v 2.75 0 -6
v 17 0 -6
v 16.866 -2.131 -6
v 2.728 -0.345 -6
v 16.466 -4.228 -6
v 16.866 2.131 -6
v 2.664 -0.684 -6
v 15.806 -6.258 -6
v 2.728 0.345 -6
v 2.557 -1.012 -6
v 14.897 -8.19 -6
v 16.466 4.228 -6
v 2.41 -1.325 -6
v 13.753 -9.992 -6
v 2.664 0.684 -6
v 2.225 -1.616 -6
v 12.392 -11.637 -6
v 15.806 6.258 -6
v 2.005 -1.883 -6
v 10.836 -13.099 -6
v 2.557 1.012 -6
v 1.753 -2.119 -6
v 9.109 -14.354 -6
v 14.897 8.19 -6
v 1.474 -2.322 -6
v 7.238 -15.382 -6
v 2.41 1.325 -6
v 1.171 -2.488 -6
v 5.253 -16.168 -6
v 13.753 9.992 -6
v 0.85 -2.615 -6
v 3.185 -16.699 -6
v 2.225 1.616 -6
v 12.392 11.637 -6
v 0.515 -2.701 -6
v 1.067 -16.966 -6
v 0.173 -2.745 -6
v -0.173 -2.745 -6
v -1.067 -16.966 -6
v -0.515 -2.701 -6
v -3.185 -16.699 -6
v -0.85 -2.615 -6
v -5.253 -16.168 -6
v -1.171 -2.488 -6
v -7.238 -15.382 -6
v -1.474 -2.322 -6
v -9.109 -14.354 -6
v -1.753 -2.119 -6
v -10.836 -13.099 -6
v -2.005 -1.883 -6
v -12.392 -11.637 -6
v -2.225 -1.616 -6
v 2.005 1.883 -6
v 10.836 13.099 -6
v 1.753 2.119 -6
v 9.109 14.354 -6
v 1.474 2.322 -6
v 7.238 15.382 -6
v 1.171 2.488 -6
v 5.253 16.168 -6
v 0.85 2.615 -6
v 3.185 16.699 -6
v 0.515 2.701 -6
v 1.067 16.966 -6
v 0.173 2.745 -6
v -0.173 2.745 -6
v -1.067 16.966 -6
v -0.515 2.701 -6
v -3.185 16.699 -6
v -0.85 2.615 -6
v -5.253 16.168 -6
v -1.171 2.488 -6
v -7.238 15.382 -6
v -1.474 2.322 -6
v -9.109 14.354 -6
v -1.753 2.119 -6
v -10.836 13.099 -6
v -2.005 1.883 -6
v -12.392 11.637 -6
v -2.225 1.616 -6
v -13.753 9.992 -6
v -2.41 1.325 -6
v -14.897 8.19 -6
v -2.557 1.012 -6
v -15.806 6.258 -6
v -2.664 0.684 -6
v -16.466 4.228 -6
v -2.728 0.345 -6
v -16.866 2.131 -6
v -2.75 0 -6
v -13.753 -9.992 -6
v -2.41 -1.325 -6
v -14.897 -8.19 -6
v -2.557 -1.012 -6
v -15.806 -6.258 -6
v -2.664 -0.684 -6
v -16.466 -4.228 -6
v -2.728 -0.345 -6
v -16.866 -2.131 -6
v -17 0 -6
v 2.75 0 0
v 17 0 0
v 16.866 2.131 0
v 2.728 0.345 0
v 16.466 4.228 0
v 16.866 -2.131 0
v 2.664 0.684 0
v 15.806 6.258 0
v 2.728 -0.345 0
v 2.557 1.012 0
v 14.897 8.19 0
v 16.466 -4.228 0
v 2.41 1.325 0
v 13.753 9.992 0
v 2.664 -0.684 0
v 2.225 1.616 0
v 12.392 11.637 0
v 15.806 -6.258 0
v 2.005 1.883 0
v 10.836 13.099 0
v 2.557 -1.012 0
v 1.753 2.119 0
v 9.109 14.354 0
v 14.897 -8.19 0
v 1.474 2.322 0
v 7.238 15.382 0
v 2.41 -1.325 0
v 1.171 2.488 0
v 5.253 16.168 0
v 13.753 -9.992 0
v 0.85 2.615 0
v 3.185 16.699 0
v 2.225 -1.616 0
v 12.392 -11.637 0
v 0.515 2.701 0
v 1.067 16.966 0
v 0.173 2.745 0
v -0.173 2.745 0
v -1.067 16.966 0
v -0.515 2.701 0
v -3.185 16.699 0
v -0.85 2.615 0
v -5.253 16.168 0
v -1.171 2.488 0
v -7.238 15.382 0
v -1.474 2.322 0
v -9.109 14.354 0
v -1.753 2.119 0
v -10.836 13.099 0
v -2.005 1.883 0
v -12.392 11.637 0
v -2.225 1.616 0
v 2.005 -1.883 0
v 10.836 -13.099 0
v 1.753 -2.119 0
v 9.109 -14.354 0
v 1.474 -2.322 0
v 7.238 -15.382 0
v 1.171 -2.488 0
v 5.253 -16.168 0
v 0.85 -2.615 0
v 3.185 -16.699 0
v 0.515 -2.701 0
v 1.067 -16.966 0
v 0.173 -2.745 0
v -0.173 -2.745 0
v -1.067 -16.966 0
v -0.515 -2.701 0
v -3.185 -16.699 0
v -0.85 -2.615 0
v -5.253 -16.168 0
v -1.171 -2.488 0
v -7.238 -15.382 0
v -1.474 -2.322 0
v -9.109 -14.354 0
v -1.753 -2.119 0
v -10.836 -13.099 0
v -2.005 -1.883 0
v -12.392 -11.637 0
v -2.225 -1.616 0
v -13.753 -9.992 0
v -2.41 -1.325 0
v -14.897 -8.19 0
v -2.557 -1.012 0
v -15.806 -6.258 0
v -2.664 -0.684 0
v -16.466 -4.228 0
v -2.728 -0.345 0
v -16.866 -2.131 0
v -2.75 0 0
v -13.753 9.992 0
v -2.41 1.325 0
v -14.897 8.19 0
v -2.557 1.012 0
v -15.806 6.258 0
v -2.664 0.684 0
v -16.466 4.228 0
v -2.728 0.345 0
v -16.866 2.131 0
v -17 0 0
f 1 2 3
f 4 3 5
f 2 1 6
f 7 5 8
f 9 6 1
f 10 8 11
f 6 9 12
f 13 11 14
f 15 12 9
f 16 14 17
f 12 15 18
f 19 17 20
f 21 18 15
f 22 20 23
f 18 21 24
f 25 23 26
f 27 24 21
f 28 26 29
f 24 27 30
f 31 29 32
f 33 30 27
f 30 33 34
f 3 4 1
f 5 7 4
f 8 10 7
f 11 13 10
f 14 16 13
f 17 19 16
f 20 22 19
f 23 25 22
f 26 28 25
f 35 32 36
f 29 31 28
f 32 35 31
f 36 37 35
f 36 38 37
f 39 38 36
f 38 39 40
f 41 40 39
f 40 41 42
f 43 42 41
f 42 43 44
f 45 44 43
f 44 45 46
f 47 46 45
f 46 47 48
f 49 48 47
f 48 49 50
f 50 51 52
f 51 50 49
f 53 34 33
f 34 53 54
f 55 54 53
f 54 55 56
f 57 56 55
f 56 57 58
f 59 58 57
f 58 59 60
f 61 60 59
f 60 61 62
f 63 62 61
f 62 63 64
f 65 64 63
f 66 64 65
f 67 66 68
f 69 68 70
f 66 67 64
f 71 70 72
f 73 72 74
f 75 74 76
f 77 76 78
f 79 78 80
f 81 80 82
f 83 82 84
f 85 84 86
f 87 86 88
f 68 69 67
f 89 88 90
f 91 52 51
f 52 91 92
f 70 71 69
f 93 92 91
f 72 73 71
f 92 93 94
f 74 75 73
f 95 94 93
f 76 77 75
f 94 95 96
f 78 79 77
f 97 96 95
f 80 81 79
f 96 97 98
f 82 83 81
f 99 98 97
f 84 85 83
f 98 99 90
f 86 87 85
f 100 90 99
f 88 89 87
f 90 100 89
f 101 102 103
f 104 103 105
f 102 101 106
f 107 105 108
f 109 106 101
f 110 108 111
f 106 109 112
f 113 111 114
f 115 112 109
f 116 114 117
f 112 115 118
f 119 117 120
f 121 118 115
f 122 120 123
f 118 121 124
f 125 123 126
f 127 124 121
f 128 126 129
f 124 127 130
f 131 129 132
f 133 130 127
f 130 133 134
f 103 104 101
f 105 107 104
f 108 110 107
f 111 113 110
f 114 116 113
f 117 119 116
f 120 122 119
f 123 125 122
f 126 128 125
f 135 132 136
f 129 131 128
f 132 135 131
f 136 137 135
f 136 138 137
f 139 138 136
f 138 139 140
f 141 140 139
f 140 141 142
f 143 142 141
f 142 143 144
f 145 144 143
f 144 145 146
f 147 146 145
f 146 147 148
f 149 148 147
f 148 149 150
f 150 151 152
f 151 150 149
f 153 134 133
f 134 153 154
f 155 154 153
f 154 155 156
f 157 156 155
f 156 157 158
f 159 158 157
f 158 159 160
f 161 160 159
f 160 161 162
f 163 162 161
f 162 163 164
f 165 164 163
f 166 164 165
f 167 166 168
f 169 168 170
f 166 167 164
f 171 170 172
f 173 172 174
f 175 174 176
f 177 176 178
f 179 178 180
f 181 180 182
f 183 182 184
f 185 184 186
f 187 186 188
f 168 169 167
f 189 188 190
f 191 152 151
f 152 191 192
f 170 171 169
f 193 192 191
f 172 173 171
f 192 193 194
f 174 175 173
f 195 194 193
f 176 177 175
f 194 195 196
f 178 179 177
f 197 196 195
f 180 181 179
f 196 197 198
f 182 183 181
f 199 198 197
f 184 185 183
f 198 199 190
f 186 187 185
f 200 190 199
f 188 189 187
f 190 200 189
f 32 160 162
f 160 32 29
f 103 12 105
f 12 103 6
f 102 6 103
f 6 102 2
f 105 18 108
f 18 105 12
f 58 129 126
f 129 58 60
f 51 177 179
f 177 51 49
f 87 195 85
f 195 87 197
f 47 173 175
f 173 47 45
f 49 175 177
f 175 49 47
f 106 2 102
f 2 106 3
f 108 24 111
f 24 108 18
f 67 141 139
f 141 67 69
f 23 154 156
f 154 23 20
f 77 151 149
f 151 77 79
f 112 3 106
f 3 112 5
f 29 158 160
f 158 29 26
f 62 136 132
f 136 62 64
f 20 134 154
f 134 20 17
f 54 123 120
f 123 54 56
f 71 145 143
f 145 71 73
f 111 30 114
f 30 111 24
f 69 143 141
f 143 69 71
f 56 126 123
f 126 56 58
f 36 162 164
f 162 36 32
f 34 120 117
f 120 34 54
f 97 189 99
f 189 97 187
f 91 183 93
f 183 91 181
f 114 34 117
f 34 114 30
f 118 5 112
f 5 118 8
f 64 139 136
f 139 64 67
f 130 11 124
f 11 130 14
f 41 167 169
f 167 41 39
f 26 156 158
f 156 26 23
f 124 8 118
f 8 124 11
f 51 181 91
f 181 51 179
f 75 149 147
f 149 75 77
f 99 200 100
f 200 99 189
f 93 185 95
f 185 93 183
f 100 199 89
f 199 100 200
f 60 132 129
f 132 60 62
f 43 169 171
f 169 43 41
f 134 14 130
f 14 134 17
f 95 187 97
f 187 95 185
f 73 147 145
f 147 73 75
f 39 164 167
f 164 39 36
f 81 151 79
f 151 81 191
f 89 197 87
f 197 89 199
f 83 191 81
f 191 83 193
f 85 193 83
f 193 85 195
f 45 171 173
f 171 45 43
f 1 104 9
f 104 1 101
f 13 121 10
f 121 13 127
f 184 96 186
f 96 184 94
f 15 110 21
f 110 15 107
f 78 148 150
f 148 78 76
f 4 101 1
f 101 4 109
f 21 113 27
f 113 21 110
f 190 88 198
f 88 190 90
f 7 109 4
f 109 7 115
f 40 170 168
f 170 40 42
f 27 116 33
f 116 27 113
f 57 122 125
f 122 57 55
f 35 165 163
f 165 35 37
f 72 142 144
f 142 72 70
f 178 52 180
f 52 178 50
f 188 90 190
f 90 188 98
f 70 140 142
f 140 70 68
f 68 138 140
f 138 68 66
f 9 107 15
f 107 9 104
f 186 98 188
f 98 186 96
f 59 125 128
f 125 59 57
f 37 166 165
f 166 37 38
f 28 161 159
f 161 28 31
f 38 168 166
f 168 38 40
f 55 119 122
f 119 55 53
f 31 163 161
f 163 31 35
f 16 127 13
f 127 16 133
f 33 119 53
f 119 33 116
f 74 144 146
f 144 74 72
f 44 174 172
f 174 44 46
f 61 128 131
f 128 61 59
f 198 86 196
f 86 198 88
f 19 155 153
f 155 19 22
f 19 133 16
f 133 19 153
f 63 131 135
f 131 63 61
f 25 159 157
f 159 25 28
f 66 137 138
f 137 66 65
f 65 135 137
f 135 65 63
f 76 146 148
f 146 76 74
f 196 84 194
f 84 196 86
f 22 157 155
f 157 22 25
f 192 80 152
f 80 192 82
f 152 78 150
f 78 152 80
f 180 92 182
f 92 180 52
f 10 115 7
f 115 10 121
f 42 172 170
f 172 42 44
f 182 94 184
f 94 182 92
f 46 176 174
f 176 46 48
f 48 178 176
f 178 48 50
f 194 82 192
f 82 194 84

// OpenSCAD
$fn = 50;


difference() {
	union() {
		translate(v = [0, 0, -6.0000000000]) {
			cylinder(h = 6, r = 7.0000000000);
		}
		translate(v = [0, 0, -6.0000000000]) {
			cylinder(h = 6, r = 17.0000000000);
		}
	}
	union() {
		#translate(v = [0, 0, -6]) {
			cylinder(h = 6, r = 2.7500000000);
		}
	}
}
